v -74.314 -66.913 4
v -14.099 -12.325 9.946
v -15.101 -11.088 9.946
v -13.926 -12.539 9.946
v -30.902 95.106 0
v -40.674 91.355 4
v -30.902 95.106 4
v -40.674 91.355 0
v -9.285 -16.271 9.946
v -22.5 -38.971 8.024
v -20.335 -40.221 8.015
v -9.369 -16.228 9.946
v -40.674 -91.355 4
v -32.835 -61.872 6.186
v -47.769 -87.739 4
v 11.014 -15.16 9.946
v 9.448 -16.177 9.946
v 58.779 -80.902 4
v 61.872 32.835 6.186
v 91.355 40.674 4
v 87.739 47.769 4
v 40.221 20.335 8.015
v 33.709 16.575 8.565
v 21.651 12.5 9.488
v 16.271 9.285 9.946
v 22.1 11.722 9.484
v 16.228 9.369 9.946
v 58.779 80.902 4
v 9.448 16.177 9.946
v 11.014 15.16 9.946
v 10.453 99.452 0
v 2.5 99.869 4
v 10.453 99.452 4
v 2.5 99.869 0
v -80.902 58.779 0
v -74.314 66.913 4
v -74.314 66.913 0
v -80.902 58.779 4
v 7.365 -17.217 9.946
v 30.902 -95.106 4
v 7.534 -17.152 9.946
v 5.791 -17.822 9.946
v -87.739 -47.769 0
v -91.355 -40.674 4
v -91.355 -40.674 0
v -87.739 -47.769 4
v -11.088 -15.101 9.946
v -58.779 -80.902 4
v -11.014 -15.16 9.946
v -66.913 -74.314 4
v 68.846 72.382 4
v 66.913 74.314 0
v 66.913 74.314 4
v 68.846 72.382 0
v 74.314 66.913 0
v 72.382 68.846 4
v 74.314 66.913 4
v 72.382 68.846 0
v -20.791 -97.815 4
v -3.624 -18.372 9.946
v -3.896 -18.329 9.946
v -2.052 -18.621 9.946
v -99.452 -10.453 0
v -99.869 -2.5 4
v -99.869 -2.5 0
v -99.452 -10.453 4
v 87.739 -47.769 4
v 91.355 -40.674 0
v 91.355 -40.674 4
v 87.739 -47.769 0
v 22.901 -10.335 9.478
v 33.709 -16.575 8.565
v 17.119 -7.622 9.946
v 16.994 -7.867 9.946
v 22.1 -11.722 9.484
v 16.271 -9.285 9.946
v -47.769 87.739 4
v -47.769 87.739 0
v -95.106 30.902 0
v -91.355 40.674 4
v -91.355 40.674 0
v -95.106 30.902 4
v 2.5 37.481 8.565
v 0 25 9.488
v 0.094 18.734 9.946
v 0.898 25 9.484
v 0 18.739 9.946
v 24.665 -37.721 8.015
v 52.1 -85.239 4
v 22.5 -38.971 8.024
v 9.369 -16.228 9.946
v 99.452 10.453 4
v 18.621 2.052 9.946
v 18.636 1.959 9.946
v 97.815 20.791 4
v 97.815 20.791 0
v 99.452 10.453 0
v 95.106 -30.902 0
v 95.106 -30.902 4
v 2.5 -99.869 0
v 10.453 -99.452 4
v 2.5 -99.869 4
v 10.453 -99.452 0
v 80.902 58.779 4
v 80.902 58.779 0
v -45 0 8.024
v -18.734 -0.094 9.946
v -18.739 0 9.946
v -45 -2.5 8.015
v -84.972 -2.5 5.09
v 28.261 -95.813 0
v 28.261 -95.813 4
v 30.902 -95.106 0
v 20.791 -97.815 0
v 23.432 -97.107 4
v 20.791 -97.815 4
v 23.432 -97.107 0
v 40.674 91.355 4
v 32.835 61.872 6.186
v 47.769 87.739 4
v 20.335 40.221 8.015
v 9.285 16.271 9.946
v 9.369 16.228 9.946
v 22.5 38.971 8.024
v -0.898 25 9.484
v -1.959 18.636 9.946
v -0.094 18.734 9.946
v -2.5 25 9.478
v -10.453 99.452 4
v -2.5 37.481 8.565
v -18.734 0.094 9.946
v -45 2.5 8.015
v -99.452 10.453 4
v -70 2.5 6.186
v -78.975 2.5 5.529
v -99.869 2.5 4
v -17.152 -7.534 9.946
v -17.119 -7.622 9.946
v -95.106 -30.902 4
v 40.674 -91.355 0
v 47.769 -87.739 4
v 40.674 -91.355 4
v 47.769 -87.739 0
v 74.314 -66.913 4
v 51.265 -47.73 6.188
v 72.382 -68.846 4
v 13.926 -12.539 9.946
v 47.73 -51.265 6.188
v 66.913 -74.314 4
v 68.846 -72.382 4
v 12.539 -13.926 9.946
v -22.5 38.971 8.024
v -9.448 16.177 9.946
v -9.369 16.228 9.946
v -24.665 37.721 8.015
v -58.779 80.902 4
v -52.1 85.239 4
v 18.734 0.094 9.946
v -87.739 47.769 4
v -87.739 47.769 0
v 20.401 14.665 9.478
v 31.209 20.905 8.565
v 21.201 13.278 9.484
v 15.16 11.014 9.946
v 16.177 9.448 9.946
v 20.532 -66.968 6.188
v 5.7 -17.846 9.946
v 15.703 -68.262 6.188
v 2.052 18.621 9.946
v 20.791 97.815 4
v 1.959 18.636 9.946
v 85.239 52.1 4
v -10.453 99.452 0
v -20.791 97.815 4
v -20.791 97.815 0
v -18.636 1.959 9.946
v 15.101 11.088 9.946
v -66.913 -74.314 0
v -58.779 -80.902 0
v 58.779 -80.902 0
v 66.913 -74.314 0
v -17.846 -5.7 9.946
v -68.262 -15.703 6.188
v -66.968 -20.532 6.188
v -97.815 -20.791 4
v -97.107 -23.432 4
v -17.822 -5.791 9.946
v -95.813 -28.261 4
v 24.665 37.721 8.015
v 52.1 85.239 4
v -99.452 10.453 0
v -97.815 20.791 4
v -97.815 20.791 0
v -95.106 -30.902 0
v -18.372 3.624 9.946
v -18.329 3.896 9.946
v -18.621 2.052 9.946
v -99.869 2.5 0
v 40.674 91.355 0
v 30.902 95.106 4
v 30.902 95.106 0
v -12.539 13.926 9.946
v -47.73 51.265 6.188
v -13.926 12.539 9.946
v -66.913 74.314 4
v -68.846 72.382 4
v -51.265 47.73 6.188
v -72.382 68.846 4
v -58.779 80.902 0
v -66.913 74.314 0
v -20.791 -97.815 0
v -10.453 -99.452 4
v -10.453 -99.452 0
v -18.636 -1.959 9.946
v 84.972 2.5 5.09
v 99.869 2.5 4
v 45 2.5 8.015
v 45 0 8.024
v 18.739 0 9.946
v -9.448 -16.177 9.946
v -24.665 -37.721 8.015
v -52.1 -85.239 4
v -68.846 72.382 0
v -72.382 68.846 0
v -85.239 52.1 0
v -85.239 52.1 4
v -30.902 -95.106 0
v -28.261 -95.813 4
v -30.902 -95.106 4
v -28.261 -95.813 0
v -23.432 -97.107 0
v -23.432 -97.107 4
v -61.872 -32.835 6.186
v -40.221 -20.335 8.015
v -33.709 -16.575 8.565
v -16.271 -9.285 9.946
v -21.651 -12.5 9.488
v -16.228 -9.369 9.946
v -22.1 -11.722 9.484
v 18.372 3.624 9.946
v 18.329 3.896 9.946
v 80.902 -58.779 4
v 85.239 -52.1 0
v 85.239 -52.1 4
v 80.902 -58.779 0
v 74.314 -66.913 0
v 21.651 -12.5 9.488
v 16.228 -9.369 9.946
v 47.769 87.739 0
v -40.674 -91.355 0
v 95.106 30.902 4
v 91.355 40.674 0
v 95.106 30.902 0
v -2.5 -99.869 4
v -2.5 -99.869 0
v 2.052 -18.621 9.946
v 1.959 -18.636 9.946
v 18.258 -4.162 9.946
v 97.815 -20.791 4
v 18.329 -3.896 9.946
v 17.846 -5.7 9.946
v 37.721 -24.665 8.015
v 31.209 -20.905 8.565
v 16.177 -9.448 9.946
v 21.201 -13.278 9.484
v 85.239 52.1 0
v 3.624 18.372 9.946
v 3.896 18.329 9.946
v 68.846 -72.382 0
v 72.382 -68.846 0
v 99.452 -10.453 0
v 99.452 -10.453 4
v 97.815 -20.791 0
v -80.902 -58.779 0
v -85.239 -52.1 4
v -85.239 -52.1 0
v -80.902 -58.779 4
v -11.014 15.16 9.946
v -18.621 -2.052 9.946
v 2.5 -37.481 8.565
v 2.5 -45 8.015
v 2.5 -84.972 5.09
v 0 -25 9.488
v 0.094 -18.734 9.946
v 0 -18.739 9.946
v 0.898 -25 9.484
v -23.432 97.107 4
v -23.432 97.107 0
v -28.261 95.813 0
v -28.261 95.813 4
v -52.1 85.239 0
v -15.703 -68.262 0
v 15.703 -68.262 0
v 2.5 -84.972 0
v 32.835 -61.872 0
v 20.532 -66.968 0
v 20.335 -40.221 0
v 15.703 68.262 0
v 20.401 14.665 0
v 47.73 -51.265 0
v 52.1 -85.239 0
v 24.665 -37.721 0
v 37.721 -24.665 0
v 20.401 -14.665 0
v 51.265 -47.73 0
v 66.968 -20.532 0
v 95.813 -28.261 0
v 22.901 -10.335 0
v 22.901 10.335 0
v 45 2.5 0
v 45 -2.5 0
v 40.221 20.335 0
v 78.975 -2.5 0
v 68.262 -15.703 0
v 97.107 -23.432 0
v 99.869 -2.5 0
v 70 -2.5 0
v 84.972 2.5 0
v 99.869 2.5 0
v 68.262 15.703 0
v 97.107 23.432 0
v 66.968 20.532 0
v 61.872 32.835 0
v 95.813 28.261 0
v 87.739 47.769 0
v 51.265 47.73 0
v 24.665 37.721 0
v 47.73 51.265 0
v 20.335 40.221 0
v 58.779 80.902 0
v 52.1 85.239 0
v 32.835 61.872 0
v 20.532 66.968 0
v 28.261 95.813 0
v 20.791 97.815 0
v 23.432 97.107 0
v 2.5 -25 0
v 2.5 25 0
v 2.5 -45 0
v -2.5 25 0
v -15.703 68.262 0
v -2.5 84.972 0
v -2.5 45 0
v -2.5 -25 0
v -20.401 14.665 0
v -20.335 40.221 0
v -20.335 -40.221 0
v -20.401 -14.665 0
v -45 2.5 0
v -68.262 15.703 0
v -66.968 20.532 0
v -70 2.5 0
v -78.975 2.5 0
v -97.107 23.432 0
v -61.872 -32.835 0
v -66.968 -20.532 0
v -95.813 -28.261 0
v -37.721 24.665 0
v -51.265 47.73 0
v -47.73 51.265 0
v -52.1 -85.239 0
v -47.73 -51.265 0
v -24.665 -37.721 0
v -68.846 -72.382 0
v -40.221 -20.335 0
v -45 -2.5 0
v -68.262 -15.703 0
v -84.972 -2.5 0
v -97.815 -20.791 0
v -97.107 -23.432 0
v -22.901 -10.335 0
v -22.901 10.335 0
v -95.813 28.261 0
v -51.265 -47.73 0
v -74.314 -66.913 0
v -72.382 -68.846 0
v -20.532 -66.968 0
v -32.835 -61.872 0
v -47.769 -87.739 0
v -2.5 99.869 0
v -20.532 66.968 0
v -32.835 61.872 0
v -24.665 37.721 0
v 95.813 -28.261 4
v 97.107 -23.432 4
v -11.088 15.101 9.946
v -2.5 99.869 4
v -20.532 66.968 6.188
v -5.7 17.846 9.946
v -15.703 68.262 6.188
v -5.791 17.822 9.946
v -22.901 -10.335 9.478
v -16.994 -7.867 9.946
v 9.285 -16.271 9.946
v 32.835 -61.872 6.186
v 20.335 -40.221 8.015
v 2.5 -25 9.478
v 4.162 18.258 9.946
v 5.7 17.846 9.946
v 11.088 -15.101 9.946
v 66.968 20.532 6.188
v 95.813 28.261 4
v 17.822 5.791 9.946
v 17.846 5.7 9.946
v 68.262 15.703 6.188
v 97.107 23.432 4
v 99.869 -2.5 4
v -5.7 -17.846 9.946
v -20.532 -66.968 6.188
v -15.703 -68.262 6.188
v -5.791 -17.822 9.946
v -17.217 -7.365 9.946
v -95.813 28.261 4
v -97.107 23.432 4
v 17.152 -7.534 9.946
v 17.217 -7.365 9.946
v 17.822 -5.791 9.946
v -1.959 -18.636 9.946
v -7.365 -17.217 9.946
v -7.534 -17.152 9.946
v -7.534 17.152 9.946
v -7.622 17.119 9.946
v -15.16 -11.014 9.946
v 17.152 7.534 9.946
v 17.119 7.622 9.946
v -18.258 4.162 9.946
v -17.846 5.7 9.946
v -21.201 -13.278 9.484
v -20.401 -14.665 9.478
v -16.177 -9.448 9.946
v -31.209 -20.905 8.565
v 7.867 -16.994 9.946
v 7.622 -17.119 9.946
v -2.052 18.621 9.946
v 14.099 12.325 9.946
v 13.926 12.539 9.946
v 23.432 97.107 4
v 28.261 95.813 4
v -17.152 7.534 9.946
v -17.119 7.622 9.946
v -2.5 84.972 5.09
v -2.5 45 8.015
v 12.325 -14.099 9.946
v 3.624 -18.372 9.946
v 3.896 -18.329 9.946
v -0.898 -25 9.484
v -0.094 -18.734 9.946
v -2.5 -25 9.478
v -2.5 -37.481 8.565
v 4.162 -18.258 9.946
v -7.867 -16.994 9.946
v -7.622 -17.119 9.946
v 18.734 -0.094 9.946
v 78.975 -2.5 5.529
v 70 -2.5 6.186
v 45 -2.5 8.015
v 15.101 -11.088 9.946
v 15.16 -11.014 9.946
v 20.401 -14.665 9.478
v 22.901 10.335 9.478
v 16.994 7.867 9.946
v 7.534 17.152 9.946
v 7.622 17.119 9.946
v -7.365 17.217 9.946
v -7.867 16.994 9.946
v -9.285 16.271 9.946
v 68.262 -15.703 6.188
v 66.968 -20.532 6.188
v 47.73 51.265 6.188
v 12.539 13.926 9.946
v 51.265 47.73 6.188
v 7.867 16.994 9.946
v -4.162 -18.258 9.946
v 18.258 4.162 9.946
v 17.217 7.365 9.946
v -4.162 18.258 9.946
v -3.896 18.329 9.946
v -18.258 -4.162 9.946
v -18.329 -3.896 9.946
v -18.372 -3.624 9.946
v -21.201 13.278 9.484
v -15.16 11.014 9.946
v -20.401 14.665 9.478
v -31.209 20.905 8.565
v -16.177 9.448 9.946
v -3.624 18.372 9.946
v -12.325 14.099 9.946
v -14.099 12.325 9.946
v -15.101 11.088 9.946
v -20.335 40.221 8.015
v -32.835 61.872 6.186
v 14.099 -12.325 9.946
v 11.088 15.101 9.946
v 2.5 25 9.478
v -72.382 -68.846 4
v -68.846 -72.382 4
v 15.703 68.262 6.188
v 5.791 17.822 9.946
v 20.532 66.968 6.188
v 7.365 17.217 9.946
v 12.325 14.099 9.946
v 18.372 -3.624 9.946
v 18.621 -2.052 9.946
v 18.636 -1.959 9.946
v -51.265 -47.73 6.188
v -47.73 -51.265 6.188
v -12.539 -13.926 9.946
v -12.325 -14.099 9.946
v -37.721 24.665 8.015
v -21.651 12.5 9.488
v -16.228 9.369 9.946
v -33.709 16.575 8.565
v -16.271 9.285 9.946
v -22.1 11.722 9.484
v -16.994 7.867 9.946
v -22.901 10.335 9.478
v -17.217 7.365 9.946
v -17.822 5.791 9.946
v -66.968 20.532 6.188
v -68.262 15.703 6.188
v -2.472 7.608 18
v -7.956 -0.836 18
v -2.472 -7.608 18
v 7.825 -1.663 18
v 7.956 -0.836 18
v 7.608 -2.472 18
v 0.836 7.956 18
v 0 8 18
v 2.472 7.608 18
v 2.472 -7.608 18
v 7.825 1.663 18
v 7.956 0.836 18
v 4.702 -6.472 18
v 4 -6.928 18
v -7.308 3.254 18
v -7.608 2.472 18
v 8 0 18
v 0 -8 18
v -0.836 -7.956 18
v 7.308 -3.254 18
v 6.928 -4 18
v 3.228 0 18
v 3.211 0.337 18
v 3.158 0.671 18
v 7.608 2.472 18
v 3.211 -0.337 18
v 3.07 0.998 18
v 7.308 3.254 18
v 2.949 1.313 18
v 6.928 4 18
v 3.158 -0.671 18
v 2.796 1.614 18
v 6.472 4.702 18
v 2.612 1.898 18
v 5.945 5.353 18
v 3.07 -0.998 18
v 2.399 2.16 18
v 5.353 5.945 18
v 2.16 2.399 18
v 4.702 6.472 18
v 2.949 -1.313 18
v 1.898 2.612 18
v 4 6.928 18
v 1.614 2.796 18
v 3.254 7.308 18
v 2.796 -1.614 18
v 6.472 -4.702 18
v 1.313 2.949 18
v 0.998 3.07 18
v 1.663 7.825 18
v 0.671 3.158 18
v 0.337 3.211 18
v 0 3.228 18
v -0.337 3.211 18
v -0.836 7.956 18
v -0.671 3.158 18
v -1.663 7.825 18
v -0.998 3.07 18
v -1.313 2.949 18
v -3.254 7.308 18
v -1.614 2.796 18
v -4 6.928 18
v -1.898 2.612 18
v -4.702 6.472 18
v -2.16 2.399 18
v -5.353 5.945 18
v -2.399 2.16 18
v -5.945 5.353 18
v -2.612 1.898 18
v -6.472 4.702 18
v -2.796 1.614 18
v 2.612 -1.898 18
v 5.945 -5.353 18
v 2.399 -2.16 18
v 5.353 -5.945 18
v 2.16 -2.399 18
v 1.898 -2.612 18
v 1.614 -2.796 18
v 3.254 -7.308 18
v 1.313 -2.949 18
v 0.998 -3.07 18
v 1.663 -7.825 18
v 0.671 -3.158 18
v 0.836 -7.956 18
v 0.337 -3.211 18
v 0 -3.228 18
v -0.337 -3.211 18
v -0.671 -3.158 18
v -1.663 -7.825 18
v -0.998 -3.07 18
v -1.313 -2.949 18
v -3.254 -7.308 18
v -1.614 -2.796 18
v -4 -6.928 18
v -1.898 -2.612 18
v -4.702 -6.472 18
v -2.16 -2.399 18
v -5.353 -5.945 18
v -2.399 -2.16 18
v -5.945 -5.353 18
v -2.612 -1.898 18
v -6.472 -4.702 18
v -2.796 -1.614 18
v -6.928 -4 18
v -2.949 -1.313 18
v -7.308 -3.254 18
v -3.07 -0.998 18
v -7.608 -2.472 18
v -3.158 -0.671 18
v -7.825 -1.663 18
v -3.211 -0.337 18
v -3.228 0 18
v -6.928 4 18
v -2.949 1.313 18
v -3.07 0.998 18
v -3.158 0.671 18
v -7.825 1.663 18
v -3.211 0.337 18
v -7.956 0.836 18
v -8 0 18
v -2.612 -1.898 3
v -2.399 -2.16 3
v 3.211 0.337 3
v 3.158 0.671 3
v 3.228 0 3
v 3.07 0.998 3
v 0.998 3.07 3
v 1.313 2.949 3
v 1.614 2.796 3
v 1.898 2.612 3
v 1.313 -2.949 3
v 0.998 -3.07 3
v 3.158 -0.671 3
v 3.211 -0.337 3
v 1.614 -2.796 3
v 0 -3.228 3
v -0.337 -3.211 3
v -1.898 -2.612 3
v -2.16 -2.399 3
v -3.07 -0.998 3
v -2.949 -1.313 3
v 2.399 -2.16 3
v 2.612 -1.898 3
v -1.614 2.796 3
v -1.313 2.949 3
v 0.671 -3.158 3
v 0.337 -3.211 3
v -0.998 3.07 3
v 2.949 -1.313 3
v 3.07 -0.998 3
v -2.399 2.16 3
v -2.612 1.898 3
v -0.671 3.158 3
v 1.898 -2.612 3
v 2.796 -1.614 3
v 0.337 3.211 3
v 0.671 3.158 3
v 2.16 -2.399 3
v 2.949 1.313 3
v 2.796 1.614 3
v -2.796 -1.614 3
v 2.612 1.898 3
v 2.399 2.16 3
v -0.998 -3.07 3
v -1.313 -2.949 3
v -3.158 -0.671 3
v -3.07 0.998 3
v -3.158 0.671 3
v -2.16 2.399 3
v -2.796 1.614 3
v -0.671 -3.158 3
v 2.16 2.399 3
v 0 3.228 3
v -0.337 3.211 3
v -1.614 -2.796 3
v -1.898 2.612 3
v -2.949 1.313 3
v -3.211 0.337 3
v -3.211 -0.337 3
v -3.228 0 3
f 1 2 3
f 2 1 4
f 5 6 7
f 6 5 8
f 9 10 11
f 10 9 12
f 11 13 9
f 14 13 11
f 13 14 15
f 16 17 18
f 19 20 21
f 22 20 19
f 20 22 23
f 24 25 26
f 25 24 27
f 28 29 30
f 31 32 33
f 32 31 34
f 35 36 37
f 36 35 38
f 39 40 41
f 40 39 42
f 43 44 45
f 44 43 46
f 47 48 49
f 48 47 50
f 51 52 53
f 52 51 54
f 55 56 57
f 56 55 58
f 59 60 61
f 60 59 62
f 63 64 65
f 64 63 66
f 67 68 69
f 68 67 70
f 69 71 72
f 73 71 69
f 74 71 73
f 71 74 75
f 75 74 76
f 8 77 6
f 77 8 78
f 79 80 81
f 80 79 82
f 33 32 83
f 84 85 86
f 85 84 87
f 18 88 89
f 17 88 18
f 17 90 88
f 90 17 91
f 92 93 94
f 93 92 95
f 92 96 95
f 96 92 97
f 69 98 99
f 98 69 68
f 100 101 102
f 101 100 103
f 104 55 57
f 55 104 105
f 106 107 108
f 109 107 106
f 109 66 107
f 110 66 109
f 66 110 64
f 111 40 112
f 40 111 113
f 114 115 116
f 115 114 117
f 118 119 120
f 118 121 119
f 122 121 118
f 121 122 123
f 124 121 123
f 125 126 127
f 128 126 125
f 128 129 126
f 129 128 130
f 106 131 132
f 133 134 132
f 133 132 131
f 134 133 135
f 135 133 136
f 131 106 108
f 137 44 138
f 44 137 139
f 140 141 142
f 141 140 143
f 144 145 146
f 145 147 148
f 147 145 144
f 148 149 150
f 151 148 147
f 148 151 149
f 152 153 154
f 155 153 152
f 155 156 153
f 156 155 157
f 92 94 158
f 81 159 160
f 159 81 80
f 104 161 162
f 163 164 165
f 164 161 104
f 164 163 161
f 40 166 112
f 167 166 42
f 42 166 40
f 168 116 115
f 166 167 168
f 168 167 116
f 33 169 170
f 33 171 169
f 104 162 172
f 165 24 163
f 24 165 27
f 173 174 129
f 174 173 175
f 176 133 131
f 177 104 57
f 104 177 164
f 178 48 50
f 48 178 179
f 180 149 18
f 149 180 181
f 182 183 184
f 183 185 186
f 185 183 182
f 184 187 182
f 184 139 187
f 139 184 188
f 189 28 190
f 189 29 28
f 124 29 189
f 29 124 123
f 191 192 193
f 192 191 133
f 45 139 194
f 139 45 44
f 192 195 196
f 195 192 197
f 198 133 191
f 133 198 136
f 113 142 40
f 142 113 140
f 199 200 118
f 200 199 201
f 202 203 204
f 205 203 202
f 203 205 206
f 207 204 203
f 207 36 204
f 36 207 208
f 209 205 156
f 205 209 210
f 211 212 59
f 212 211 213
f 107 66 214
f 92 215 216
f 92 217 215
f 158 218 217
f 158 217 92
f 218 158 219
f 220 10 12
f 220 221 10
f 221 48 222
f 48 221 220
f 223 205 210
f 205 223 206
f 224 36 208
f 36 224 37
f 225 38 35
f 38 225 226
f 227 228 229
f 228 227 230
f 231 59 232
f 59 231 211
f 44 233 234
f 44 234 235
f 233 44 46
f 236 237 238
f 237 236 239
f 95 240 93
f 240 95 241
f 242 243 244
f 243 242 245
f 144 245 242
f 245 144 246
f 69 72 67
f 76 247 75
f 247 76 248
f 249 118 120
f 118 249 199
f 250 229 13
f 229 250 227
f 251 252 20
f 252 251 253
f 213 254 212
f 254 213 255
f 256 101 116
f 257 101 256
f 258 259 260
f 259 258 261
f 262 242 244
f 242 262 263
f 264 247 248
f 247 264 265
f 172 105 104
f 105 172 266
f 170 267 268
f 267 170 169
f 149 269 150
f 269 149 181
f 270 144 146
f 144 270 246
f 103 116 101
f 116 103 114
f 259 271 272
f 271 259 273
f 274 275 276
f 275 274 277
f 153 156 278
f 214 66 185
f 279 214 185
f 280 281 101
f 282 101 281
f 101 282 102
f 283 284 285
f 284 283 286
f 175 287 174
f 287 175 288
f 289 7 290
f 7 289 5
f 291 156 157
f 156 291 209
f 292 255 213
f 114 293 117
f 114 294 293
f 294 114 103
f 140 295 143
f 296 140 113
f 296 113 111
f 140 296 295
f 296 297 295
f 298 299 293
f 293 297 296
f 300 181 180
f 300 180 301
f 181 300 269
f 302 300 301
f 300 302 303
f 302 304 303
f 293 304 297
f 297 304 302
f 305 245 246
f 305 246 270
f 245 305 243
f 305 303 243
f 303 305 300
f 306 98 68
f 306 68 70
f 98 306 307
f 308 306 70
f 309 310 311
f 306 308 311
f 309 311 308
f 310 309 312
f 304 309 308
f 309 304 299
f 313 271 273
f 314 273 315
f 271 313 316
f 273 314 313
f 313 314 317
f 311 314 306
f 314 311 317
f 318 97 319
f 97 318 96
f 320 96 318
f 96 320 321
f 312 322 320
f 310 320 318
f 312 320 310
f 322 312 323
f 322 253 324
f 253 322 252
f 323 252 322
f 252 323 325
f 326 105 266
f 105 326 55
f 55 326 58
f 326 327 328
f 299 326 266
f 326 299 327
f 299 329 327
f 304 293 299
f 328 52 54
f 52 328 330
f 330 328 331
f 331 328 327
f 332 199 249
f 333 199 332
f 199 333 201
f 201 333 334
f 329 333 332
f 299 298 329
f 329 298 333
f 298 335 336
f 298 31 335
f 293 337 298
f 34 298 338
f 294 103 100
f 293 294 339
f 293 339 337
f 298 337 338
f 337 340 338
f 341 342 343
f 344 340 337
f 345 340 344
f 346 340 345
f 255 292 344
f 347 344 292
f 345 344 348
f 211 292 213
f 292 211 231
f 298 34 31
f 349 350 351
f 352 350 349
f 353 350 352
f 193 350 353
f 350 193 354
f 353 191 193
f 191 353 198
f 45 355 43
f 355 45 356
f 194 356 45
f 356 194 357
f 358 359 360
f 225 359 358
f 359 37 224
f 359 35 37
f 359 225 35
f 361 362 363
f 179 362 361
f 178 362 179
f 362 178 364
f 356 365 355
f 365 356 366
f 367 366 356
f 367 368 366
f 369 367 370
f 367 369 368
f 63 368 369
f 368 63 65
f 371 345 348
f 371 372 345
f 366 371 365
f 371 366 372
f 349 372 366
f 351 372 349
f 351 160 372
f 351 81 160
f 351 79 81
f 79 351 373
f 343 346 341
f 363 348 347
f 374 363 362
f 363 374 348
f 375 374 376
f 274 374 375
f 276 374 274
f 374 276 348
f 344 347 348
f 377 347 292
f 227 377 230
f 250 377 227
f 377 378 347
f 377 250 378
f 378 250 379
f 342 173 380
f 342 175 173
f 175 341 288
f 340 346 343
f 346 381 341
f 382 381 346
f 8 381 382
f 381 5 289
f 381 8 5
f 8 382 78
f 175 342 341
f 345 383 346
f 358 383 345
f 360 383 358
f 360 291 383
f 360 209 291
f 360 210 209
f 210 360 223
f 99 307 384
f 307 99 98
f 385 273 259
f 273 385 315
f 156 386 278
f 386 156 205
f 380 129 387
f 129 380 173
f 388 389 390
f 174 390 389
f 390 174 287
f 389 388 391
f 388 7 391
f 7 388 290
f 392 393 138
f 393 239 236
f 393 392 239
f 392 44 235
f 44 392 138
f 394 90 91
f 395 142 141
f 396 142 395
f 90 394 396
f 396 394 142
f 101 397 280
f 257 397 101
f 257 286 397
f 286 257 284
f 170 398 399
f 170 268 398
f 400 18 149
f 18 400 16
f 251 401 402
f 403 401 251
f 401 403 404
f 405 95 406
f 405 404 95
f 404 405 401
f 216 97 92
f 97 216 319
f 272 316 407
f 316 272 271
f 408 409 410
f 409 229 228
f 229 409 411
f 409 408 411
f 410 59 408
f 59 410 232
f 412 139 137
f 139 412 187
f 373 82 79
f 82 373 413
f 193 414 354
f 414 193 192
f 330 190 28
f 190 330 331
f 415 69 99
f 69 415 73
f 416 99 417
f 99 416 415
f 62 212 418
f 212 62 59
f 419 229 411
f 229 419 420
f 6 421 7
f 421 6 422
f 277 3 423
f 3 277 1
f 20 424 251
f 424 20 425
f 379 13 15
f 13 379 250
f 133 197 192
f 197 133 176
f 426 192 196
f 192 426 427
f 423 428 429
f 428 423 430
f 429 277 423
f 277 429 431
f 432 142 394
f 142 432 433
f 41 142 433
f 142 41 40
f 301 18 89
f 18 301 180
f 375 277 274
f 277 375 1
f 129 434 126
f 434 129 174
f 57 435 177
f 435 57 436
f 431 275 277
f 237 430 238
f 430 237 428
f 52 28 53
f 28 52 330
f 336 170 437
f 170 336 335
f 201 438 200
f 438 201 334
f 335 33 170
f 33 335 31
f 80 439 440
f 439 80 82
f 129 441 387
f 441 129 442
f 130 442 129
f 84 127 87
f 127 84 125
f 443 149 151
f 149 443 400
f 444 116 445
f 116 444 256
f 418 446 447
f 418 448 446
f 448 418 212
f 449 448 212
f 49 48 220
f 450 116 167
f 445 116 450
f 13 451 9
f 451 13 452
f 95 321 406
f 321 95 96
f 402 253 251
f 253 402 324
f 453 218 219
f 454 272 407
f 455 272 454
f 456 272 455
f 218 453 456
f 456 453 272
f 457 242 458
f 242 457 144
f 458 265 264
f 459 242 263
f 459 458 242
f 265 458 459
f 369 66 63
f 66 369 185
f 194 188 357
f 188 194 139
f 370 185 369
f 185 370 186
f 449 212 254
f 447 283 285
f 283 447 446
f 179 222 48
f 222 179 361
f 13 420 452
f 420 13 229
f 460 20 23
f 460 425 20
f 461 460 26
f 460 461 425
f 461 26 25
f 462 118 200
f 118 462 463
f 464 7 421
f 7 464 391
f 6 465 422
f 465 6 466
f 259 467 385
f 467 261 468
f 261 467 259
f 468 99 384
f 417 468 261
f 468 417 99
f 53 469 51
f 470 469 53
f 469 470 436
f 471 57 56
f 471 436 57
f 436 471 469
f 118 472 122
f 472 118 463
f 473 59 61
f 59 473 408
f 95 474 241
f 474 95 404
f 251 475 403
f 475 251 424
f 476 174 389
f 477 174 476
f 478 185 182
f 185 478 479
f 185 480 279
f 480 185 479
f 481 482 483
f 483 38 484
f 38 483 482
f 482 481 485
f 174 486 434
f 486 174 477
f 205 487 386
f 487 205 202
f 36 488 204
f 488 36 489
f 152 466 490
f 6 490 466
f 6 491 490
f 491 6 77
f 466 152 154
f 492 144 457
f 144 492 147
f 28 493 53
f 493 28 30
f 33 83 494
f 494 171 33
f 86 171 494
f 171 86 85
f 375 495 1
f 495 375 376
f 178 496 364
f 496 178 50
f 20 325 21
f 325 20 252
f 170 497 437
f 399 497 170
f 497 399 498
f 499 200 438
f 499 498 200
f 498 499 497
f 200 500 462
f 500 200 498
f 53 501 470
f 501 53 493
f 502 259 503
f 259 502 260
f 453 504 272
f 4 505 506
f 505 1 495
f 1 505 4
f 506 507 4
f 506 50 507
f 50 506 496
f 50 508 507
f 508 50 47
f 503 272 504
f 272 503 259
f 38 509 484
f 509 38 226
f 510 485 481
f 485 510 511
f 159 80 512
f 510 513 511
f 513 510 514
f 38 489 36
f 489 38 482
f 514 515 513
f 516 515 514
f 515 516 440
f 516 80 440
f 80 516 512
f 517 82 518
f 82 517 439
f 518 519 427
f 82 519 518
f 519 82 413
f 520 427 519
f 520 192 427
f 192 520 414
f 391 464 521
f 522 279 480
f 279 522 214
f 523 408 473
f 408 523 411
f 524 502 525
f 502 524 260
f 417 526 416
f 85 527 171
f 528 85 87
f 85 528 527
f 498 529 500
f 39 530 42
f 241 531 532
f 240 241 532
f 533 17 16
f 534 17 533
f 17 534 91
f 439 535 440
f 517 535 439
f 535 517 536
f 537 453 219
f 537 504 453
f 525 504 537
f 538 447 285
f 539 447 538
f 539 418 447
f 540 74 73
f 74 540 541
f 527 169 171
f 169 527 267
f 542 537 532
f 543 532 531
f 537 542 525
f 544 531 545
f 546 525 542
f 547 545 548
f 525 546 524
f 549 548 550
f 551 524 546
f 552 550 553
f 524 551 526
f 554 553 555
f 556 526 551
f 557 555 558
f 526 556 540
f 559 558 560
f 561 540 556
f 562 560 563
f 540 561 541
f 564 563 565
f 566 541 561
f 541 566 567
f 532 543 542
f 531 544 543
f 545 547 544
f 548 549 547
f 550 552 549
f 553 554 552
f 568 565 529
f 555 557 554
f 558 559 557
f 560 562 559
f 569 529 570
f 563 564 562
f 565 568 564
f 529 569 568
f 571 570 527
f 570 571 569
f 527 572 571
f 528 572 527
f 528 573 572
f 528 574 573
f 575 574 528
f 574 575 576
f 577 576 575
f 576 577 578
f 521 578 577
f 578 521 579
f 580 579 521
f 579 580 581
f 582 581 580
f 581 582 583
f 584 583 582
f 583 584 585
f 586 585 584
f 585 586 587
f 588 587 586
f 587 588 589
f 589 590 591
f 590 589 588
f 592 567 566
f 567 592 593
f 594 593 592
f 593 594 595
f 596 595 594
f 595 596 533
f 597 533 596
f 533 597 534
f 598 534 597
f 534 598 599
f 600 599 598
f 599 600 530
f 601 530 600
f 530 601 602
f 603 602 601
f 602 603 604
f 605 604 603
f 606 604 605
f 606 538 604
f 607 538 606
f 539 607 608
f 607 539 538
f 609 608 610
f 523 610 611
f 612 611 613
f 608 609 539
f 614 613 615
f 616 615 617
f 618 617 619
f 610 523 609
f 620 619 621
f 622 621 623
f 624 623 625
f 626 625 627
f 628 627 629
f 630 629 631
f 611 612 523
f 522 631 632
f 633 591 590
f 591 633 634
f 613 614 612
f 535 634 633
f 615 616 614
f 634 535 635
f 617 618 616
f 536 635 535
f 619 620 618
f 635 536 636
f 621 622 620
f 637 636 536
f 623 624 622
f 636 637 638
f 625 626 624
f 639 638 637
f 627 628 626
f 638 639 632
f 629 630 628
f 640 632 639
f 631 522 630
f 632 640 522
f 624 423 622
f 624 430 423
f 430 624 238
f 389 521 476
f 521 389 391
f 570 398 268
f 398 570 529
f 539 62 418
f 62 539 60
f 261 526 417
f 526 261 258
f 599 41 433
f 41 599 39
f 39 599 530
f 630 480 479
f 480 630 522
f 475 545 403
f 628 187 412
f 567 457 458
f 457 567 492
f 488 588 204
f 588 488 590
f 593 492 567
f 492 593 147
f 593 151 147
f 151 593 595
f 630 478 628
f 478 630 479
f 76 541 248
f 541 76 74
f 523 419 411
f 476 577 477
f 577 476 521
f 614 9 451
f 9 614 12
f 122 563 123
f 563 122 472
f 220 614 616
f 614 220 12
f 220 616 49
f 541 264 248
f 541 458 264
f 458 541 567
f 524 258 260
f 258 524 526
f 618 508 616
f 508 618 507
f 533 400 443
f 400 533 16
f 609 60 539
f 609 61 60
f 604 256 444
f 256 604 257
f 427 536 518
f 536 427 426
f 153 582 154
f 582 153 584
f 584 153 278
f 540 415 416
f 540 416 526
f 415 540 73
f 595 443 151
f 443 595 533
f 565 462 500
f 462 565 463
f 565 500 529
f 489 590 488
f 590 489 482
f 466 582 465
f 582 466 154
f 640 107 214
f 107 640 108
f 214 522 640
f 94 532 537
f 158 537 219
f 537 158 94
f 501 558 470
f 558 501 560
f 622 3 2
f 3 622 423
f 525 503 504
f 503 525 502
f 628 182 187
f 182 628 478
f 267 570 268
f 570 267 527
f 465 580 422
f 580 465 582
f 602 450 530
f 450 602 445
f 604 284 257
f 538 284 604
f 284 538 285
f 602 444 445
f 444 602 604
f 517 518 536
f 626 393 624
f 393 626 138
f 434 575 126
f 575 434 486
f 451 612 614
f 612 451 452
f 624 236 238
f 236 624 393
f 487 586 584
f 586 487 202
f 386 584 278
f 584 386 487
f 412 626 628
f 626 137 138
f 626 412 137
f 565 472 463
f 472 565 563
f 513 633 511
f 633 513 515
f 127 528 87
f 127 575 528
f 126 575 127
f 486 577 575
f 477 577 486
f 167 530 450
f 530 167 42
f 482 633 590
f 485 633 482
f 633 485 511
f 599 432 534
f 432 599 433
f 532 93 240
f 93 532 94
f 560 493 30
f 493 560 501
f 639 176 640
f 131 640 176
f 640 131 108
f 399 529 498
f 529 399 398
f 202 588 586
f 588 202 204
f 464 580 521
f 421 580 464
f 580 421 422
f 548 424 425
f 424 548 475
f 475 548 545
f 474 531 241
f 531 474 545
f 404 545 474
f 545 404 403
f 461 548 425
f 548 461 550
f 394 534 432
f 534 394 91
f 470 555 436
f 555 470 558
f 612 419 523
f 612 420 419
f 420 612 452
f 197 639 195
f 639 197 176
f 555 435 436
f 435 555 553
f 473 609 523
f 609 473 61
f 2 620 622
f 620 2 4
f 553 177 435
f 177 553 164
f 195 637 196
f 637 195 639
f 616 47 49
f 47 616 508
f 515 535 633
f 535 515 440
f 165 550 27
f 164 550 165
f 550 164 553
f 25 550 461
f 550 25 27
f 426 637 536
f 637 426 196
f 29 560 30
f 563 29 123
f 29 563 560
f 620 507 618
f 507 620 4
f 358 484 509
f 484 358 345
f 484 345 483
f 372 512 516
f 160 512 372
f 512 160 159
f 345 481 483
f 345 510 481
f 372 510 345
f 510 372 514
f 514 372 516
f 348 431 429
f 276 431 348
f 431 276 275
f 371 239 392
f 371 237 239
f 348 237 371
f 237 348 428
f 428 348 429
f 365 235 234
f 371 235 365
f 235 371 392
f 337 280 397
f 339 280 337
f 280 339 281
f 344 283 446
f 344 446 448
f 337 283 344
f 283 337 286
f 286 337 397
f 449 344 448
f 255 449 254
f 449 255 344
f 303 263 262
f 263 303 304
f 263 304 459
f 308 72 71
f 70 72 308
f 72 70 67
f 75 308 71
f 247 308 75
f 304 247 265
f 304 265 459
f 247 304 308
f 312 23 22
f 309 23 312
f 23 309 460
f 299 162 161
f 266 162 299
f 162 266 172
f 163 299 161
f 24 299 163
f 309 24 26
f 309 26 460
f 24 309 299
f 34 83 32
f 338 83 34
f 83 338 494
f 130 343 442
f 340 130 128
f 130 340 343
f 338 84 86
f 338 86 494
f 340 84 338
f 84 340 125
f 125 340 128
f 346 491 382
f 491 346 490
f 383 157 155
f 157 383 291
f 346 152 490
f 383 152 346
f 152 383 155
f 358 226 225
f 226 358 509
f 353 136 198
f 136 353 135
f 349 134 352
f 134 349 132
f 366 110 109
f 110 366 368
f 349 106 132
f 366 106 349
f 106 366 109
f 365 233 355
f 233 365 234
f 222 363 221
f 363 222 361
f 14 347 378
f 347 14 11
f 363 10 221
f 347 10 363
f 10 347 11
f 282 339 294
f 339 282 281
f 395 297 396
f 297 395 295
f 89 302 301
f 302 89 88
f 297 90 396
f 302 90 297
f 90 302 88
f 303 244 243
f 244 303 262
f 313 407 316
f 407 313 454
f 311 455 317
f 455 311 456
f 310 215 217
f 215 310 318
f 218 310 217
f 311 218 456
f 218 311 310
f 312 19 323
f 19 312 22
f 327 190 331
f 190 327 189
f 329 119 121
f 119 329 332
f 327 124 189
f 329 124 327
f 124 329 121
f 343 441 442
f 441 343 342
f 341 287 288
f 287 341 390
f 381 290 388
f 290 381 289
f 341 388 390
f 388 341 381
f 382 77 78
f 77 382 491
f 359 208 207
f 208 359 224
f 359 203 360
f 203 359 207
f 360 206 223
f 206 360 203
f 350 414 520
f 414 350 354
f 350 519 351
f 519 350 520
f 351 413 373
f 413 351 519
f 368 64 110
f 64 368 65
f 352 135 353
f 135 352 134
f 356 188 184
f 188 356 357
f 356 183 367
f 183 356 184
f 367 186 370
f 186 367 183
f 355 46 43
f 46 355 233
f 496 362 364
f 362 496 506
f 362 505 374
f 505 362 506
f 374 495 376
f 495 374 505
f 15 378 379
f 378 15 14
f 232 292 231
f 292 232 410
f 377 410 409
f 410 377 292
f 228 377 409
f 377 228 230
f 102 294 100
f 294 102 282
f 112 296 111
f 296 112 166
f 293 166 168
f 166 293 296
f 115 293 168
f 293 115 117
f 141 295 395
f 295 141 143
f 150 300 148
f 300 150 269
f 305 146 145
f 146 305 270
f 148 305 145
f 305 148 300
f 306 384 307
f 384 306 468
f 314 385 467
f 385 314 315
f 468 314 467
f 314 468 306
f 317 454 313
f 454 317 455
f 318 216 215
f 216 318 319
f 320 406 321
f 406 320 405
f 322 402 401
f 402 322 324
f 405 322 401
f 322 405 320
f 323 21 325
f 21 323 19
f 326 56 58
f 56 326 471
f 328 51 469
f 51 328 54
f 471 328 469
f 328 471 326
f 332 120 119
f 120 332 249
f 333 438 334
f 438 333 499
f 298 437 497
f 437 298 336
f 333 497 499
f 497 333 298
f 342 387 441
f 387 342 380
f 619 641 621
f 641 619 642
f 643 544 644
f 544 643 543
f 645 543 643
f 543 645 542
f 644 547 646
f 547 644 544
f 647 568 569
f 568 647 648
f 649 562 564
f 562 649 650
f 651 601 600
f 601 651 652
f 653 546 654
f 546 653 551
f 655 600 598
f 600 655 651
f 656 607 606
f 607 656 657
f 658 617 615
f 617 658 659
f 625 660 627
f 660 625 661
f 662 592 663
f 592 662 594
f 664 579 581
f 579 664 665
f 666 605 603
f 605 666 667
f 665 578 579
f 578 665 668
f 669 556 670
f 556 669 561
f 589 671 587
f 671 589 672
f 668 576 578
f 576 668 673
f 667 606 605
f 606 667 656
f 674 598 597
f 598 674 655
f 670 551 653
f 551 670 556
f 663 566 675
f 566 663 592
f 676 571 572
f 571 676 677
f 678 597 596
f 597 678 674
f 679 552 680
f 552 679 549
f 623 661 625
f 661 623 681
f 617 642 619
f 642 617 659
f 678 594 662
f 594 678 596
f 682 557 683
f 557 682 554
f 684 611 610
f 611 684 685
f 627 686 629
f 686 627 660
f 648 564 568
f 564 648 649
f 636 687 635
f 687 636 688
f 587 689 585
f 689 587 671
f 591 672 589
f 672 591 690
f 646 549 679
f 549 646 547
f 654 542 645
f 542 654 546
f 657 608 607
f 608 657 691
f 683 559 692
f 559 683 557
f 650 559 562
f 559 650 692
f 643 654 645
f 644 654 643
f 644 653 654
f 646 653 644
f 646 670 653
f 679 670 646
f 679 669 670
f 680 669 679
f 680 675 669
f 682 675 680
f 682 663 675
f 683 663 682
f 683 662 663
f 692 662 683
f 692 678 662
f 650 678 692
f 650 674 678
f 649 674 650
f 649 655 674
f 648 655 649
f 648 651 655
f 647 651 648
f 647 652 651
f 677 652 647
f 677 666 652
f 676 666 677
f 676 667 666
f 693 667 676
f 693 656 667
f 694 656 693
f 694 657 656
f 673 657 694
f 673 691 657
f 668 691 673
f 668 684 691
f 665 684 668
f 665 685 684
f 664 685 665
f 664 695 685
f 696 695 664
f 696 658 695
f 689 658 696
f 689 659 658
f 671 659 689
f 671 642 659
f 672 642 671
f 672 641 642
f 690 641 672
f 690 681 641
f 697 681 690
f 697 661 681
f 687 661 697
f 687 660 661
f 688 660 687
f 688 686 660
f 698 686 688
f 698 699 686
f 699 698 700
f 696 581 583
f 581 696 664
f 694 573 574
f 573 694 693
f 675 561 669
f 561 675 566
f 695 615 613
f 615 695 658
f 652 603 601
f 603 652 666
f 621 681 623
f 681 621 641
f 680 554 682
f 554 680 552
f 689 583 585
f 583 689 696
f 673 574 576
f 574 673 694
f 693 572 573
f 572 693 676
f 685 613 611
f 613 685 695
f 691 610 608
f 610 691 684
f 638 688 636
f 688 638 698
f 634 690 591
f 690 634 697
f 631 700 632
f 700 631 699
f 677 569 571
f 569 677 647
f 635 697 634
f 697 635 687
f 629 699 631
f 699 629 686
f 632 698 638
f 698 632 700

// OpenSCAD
$fn = 60;
seed = 23718906;

plate_r = 100;
plate_h = 6;

base_ir = 18;
base_ih = 10;
base_or = 100;
base_oh = 4;

mound_or = 24;
mound_ir = 8;
mound_h = 18;

u_edge_h = 6;
u_edge_w = 2;
u_edge_ir = plate_r - (u_edge_h + u_edge_w);
u_edge_or = plate_r - u_edge_w;

l_edge_h = (plate_h + u_edge_h) - 3;
l_edge_ir = plate_r - 7;

major_n = 6;
major_r = 360 / major_n;

cable_w = 5;

pole_h = 20;
pole_r = 6.33/2 * 1.02;
pole_d = 3;

offsets = [
    25,
    45,
    70,
];

//tree_plate();
tree_base();
//pole_hole();

module tree_base() {
    difference() {
        union() {
            hull() {
                cylinder(r=base_ir, h=base_ih);
                cylinder(r=base_or, h=base_oh);
            }
            mound();
        }
        cable_slots();
        translate([0,0,pole_h+pole_d])
            pole();
    }
}

module tree_plate() {
    difference() {
        plate_body();
        cable_slots();
        slot_corners();
        difference() {
            union() {
                top_bowl();
                top_boundary();
            }
            mound();
        }
        translate([0,0,mound_h-pole_d])
            pole();
    }
}

module mound() {
    hull() {
        cylinder(r=mound_or, h=plate_h);
        cylinder(r=mound_ir, h=mound_h);
    }
}

module pole_hole() {
    difference() {
        cylinder(r=pole_r*2, h=pole_d*3);
        translate([0,0,pole_d])
        pole();
    }
}

module pole() {
    translate([0,0,-pole_h])
    cylinder(r=pole_r, h=pole_h);
}

module plate_body() {
    union() {
        hull() {
            cylinder(r=l_edge_ir, h=l_edge_h);
            translate([0,0,l_edge_h])
                cylinder(r=plate_r, h=3*plate_h);
        }
    }
}

module cable_slots() {
    for (i = [0:len(offsets)-1]) {
        rotate([0,0,major_r / pow(2,i)])
        wrotate([0,0,major_r/pow(2,i)], major_n*pow(2,i))
        translate([-2.5,offsets[i],-5*plate_h])
            cube([cable_w,plate_r,plate_h*10]);
    }
}

module top_bowl() {
    hull() {
        translate([0,0,plate_h])
            cylinder(r=u_edge_ir, h=plate_h);
        translate([0,0,plate_h+u_edge_h])
            cylinder(r=u_edge_or, h=plate_h);
    }
}

module top_boundary() {
    translate([0,0,plate_h+u_edge_h])
        cylinder(r=plate_r*1.1, h=10*plate_h);
}

module slot_corners() {
    wrotate([0,0,360/24], 24)
        translate([plate_r+6,0,0])
        rotate([0,0,45])
        cube([20,20,40], center=true);
}


module wrotate(r=[0,0,90], n=1) {
    union() {
        for (i = [0:n-1]) {
            rotate(r*i) {
                children();
            }
        }
    }
}


module rcolor() {
    union() {
        for (i = [0:$children-1]) {
            color(rands(0,1,3, i+seed)) {
                children(i);
            }
        }
    }
}
